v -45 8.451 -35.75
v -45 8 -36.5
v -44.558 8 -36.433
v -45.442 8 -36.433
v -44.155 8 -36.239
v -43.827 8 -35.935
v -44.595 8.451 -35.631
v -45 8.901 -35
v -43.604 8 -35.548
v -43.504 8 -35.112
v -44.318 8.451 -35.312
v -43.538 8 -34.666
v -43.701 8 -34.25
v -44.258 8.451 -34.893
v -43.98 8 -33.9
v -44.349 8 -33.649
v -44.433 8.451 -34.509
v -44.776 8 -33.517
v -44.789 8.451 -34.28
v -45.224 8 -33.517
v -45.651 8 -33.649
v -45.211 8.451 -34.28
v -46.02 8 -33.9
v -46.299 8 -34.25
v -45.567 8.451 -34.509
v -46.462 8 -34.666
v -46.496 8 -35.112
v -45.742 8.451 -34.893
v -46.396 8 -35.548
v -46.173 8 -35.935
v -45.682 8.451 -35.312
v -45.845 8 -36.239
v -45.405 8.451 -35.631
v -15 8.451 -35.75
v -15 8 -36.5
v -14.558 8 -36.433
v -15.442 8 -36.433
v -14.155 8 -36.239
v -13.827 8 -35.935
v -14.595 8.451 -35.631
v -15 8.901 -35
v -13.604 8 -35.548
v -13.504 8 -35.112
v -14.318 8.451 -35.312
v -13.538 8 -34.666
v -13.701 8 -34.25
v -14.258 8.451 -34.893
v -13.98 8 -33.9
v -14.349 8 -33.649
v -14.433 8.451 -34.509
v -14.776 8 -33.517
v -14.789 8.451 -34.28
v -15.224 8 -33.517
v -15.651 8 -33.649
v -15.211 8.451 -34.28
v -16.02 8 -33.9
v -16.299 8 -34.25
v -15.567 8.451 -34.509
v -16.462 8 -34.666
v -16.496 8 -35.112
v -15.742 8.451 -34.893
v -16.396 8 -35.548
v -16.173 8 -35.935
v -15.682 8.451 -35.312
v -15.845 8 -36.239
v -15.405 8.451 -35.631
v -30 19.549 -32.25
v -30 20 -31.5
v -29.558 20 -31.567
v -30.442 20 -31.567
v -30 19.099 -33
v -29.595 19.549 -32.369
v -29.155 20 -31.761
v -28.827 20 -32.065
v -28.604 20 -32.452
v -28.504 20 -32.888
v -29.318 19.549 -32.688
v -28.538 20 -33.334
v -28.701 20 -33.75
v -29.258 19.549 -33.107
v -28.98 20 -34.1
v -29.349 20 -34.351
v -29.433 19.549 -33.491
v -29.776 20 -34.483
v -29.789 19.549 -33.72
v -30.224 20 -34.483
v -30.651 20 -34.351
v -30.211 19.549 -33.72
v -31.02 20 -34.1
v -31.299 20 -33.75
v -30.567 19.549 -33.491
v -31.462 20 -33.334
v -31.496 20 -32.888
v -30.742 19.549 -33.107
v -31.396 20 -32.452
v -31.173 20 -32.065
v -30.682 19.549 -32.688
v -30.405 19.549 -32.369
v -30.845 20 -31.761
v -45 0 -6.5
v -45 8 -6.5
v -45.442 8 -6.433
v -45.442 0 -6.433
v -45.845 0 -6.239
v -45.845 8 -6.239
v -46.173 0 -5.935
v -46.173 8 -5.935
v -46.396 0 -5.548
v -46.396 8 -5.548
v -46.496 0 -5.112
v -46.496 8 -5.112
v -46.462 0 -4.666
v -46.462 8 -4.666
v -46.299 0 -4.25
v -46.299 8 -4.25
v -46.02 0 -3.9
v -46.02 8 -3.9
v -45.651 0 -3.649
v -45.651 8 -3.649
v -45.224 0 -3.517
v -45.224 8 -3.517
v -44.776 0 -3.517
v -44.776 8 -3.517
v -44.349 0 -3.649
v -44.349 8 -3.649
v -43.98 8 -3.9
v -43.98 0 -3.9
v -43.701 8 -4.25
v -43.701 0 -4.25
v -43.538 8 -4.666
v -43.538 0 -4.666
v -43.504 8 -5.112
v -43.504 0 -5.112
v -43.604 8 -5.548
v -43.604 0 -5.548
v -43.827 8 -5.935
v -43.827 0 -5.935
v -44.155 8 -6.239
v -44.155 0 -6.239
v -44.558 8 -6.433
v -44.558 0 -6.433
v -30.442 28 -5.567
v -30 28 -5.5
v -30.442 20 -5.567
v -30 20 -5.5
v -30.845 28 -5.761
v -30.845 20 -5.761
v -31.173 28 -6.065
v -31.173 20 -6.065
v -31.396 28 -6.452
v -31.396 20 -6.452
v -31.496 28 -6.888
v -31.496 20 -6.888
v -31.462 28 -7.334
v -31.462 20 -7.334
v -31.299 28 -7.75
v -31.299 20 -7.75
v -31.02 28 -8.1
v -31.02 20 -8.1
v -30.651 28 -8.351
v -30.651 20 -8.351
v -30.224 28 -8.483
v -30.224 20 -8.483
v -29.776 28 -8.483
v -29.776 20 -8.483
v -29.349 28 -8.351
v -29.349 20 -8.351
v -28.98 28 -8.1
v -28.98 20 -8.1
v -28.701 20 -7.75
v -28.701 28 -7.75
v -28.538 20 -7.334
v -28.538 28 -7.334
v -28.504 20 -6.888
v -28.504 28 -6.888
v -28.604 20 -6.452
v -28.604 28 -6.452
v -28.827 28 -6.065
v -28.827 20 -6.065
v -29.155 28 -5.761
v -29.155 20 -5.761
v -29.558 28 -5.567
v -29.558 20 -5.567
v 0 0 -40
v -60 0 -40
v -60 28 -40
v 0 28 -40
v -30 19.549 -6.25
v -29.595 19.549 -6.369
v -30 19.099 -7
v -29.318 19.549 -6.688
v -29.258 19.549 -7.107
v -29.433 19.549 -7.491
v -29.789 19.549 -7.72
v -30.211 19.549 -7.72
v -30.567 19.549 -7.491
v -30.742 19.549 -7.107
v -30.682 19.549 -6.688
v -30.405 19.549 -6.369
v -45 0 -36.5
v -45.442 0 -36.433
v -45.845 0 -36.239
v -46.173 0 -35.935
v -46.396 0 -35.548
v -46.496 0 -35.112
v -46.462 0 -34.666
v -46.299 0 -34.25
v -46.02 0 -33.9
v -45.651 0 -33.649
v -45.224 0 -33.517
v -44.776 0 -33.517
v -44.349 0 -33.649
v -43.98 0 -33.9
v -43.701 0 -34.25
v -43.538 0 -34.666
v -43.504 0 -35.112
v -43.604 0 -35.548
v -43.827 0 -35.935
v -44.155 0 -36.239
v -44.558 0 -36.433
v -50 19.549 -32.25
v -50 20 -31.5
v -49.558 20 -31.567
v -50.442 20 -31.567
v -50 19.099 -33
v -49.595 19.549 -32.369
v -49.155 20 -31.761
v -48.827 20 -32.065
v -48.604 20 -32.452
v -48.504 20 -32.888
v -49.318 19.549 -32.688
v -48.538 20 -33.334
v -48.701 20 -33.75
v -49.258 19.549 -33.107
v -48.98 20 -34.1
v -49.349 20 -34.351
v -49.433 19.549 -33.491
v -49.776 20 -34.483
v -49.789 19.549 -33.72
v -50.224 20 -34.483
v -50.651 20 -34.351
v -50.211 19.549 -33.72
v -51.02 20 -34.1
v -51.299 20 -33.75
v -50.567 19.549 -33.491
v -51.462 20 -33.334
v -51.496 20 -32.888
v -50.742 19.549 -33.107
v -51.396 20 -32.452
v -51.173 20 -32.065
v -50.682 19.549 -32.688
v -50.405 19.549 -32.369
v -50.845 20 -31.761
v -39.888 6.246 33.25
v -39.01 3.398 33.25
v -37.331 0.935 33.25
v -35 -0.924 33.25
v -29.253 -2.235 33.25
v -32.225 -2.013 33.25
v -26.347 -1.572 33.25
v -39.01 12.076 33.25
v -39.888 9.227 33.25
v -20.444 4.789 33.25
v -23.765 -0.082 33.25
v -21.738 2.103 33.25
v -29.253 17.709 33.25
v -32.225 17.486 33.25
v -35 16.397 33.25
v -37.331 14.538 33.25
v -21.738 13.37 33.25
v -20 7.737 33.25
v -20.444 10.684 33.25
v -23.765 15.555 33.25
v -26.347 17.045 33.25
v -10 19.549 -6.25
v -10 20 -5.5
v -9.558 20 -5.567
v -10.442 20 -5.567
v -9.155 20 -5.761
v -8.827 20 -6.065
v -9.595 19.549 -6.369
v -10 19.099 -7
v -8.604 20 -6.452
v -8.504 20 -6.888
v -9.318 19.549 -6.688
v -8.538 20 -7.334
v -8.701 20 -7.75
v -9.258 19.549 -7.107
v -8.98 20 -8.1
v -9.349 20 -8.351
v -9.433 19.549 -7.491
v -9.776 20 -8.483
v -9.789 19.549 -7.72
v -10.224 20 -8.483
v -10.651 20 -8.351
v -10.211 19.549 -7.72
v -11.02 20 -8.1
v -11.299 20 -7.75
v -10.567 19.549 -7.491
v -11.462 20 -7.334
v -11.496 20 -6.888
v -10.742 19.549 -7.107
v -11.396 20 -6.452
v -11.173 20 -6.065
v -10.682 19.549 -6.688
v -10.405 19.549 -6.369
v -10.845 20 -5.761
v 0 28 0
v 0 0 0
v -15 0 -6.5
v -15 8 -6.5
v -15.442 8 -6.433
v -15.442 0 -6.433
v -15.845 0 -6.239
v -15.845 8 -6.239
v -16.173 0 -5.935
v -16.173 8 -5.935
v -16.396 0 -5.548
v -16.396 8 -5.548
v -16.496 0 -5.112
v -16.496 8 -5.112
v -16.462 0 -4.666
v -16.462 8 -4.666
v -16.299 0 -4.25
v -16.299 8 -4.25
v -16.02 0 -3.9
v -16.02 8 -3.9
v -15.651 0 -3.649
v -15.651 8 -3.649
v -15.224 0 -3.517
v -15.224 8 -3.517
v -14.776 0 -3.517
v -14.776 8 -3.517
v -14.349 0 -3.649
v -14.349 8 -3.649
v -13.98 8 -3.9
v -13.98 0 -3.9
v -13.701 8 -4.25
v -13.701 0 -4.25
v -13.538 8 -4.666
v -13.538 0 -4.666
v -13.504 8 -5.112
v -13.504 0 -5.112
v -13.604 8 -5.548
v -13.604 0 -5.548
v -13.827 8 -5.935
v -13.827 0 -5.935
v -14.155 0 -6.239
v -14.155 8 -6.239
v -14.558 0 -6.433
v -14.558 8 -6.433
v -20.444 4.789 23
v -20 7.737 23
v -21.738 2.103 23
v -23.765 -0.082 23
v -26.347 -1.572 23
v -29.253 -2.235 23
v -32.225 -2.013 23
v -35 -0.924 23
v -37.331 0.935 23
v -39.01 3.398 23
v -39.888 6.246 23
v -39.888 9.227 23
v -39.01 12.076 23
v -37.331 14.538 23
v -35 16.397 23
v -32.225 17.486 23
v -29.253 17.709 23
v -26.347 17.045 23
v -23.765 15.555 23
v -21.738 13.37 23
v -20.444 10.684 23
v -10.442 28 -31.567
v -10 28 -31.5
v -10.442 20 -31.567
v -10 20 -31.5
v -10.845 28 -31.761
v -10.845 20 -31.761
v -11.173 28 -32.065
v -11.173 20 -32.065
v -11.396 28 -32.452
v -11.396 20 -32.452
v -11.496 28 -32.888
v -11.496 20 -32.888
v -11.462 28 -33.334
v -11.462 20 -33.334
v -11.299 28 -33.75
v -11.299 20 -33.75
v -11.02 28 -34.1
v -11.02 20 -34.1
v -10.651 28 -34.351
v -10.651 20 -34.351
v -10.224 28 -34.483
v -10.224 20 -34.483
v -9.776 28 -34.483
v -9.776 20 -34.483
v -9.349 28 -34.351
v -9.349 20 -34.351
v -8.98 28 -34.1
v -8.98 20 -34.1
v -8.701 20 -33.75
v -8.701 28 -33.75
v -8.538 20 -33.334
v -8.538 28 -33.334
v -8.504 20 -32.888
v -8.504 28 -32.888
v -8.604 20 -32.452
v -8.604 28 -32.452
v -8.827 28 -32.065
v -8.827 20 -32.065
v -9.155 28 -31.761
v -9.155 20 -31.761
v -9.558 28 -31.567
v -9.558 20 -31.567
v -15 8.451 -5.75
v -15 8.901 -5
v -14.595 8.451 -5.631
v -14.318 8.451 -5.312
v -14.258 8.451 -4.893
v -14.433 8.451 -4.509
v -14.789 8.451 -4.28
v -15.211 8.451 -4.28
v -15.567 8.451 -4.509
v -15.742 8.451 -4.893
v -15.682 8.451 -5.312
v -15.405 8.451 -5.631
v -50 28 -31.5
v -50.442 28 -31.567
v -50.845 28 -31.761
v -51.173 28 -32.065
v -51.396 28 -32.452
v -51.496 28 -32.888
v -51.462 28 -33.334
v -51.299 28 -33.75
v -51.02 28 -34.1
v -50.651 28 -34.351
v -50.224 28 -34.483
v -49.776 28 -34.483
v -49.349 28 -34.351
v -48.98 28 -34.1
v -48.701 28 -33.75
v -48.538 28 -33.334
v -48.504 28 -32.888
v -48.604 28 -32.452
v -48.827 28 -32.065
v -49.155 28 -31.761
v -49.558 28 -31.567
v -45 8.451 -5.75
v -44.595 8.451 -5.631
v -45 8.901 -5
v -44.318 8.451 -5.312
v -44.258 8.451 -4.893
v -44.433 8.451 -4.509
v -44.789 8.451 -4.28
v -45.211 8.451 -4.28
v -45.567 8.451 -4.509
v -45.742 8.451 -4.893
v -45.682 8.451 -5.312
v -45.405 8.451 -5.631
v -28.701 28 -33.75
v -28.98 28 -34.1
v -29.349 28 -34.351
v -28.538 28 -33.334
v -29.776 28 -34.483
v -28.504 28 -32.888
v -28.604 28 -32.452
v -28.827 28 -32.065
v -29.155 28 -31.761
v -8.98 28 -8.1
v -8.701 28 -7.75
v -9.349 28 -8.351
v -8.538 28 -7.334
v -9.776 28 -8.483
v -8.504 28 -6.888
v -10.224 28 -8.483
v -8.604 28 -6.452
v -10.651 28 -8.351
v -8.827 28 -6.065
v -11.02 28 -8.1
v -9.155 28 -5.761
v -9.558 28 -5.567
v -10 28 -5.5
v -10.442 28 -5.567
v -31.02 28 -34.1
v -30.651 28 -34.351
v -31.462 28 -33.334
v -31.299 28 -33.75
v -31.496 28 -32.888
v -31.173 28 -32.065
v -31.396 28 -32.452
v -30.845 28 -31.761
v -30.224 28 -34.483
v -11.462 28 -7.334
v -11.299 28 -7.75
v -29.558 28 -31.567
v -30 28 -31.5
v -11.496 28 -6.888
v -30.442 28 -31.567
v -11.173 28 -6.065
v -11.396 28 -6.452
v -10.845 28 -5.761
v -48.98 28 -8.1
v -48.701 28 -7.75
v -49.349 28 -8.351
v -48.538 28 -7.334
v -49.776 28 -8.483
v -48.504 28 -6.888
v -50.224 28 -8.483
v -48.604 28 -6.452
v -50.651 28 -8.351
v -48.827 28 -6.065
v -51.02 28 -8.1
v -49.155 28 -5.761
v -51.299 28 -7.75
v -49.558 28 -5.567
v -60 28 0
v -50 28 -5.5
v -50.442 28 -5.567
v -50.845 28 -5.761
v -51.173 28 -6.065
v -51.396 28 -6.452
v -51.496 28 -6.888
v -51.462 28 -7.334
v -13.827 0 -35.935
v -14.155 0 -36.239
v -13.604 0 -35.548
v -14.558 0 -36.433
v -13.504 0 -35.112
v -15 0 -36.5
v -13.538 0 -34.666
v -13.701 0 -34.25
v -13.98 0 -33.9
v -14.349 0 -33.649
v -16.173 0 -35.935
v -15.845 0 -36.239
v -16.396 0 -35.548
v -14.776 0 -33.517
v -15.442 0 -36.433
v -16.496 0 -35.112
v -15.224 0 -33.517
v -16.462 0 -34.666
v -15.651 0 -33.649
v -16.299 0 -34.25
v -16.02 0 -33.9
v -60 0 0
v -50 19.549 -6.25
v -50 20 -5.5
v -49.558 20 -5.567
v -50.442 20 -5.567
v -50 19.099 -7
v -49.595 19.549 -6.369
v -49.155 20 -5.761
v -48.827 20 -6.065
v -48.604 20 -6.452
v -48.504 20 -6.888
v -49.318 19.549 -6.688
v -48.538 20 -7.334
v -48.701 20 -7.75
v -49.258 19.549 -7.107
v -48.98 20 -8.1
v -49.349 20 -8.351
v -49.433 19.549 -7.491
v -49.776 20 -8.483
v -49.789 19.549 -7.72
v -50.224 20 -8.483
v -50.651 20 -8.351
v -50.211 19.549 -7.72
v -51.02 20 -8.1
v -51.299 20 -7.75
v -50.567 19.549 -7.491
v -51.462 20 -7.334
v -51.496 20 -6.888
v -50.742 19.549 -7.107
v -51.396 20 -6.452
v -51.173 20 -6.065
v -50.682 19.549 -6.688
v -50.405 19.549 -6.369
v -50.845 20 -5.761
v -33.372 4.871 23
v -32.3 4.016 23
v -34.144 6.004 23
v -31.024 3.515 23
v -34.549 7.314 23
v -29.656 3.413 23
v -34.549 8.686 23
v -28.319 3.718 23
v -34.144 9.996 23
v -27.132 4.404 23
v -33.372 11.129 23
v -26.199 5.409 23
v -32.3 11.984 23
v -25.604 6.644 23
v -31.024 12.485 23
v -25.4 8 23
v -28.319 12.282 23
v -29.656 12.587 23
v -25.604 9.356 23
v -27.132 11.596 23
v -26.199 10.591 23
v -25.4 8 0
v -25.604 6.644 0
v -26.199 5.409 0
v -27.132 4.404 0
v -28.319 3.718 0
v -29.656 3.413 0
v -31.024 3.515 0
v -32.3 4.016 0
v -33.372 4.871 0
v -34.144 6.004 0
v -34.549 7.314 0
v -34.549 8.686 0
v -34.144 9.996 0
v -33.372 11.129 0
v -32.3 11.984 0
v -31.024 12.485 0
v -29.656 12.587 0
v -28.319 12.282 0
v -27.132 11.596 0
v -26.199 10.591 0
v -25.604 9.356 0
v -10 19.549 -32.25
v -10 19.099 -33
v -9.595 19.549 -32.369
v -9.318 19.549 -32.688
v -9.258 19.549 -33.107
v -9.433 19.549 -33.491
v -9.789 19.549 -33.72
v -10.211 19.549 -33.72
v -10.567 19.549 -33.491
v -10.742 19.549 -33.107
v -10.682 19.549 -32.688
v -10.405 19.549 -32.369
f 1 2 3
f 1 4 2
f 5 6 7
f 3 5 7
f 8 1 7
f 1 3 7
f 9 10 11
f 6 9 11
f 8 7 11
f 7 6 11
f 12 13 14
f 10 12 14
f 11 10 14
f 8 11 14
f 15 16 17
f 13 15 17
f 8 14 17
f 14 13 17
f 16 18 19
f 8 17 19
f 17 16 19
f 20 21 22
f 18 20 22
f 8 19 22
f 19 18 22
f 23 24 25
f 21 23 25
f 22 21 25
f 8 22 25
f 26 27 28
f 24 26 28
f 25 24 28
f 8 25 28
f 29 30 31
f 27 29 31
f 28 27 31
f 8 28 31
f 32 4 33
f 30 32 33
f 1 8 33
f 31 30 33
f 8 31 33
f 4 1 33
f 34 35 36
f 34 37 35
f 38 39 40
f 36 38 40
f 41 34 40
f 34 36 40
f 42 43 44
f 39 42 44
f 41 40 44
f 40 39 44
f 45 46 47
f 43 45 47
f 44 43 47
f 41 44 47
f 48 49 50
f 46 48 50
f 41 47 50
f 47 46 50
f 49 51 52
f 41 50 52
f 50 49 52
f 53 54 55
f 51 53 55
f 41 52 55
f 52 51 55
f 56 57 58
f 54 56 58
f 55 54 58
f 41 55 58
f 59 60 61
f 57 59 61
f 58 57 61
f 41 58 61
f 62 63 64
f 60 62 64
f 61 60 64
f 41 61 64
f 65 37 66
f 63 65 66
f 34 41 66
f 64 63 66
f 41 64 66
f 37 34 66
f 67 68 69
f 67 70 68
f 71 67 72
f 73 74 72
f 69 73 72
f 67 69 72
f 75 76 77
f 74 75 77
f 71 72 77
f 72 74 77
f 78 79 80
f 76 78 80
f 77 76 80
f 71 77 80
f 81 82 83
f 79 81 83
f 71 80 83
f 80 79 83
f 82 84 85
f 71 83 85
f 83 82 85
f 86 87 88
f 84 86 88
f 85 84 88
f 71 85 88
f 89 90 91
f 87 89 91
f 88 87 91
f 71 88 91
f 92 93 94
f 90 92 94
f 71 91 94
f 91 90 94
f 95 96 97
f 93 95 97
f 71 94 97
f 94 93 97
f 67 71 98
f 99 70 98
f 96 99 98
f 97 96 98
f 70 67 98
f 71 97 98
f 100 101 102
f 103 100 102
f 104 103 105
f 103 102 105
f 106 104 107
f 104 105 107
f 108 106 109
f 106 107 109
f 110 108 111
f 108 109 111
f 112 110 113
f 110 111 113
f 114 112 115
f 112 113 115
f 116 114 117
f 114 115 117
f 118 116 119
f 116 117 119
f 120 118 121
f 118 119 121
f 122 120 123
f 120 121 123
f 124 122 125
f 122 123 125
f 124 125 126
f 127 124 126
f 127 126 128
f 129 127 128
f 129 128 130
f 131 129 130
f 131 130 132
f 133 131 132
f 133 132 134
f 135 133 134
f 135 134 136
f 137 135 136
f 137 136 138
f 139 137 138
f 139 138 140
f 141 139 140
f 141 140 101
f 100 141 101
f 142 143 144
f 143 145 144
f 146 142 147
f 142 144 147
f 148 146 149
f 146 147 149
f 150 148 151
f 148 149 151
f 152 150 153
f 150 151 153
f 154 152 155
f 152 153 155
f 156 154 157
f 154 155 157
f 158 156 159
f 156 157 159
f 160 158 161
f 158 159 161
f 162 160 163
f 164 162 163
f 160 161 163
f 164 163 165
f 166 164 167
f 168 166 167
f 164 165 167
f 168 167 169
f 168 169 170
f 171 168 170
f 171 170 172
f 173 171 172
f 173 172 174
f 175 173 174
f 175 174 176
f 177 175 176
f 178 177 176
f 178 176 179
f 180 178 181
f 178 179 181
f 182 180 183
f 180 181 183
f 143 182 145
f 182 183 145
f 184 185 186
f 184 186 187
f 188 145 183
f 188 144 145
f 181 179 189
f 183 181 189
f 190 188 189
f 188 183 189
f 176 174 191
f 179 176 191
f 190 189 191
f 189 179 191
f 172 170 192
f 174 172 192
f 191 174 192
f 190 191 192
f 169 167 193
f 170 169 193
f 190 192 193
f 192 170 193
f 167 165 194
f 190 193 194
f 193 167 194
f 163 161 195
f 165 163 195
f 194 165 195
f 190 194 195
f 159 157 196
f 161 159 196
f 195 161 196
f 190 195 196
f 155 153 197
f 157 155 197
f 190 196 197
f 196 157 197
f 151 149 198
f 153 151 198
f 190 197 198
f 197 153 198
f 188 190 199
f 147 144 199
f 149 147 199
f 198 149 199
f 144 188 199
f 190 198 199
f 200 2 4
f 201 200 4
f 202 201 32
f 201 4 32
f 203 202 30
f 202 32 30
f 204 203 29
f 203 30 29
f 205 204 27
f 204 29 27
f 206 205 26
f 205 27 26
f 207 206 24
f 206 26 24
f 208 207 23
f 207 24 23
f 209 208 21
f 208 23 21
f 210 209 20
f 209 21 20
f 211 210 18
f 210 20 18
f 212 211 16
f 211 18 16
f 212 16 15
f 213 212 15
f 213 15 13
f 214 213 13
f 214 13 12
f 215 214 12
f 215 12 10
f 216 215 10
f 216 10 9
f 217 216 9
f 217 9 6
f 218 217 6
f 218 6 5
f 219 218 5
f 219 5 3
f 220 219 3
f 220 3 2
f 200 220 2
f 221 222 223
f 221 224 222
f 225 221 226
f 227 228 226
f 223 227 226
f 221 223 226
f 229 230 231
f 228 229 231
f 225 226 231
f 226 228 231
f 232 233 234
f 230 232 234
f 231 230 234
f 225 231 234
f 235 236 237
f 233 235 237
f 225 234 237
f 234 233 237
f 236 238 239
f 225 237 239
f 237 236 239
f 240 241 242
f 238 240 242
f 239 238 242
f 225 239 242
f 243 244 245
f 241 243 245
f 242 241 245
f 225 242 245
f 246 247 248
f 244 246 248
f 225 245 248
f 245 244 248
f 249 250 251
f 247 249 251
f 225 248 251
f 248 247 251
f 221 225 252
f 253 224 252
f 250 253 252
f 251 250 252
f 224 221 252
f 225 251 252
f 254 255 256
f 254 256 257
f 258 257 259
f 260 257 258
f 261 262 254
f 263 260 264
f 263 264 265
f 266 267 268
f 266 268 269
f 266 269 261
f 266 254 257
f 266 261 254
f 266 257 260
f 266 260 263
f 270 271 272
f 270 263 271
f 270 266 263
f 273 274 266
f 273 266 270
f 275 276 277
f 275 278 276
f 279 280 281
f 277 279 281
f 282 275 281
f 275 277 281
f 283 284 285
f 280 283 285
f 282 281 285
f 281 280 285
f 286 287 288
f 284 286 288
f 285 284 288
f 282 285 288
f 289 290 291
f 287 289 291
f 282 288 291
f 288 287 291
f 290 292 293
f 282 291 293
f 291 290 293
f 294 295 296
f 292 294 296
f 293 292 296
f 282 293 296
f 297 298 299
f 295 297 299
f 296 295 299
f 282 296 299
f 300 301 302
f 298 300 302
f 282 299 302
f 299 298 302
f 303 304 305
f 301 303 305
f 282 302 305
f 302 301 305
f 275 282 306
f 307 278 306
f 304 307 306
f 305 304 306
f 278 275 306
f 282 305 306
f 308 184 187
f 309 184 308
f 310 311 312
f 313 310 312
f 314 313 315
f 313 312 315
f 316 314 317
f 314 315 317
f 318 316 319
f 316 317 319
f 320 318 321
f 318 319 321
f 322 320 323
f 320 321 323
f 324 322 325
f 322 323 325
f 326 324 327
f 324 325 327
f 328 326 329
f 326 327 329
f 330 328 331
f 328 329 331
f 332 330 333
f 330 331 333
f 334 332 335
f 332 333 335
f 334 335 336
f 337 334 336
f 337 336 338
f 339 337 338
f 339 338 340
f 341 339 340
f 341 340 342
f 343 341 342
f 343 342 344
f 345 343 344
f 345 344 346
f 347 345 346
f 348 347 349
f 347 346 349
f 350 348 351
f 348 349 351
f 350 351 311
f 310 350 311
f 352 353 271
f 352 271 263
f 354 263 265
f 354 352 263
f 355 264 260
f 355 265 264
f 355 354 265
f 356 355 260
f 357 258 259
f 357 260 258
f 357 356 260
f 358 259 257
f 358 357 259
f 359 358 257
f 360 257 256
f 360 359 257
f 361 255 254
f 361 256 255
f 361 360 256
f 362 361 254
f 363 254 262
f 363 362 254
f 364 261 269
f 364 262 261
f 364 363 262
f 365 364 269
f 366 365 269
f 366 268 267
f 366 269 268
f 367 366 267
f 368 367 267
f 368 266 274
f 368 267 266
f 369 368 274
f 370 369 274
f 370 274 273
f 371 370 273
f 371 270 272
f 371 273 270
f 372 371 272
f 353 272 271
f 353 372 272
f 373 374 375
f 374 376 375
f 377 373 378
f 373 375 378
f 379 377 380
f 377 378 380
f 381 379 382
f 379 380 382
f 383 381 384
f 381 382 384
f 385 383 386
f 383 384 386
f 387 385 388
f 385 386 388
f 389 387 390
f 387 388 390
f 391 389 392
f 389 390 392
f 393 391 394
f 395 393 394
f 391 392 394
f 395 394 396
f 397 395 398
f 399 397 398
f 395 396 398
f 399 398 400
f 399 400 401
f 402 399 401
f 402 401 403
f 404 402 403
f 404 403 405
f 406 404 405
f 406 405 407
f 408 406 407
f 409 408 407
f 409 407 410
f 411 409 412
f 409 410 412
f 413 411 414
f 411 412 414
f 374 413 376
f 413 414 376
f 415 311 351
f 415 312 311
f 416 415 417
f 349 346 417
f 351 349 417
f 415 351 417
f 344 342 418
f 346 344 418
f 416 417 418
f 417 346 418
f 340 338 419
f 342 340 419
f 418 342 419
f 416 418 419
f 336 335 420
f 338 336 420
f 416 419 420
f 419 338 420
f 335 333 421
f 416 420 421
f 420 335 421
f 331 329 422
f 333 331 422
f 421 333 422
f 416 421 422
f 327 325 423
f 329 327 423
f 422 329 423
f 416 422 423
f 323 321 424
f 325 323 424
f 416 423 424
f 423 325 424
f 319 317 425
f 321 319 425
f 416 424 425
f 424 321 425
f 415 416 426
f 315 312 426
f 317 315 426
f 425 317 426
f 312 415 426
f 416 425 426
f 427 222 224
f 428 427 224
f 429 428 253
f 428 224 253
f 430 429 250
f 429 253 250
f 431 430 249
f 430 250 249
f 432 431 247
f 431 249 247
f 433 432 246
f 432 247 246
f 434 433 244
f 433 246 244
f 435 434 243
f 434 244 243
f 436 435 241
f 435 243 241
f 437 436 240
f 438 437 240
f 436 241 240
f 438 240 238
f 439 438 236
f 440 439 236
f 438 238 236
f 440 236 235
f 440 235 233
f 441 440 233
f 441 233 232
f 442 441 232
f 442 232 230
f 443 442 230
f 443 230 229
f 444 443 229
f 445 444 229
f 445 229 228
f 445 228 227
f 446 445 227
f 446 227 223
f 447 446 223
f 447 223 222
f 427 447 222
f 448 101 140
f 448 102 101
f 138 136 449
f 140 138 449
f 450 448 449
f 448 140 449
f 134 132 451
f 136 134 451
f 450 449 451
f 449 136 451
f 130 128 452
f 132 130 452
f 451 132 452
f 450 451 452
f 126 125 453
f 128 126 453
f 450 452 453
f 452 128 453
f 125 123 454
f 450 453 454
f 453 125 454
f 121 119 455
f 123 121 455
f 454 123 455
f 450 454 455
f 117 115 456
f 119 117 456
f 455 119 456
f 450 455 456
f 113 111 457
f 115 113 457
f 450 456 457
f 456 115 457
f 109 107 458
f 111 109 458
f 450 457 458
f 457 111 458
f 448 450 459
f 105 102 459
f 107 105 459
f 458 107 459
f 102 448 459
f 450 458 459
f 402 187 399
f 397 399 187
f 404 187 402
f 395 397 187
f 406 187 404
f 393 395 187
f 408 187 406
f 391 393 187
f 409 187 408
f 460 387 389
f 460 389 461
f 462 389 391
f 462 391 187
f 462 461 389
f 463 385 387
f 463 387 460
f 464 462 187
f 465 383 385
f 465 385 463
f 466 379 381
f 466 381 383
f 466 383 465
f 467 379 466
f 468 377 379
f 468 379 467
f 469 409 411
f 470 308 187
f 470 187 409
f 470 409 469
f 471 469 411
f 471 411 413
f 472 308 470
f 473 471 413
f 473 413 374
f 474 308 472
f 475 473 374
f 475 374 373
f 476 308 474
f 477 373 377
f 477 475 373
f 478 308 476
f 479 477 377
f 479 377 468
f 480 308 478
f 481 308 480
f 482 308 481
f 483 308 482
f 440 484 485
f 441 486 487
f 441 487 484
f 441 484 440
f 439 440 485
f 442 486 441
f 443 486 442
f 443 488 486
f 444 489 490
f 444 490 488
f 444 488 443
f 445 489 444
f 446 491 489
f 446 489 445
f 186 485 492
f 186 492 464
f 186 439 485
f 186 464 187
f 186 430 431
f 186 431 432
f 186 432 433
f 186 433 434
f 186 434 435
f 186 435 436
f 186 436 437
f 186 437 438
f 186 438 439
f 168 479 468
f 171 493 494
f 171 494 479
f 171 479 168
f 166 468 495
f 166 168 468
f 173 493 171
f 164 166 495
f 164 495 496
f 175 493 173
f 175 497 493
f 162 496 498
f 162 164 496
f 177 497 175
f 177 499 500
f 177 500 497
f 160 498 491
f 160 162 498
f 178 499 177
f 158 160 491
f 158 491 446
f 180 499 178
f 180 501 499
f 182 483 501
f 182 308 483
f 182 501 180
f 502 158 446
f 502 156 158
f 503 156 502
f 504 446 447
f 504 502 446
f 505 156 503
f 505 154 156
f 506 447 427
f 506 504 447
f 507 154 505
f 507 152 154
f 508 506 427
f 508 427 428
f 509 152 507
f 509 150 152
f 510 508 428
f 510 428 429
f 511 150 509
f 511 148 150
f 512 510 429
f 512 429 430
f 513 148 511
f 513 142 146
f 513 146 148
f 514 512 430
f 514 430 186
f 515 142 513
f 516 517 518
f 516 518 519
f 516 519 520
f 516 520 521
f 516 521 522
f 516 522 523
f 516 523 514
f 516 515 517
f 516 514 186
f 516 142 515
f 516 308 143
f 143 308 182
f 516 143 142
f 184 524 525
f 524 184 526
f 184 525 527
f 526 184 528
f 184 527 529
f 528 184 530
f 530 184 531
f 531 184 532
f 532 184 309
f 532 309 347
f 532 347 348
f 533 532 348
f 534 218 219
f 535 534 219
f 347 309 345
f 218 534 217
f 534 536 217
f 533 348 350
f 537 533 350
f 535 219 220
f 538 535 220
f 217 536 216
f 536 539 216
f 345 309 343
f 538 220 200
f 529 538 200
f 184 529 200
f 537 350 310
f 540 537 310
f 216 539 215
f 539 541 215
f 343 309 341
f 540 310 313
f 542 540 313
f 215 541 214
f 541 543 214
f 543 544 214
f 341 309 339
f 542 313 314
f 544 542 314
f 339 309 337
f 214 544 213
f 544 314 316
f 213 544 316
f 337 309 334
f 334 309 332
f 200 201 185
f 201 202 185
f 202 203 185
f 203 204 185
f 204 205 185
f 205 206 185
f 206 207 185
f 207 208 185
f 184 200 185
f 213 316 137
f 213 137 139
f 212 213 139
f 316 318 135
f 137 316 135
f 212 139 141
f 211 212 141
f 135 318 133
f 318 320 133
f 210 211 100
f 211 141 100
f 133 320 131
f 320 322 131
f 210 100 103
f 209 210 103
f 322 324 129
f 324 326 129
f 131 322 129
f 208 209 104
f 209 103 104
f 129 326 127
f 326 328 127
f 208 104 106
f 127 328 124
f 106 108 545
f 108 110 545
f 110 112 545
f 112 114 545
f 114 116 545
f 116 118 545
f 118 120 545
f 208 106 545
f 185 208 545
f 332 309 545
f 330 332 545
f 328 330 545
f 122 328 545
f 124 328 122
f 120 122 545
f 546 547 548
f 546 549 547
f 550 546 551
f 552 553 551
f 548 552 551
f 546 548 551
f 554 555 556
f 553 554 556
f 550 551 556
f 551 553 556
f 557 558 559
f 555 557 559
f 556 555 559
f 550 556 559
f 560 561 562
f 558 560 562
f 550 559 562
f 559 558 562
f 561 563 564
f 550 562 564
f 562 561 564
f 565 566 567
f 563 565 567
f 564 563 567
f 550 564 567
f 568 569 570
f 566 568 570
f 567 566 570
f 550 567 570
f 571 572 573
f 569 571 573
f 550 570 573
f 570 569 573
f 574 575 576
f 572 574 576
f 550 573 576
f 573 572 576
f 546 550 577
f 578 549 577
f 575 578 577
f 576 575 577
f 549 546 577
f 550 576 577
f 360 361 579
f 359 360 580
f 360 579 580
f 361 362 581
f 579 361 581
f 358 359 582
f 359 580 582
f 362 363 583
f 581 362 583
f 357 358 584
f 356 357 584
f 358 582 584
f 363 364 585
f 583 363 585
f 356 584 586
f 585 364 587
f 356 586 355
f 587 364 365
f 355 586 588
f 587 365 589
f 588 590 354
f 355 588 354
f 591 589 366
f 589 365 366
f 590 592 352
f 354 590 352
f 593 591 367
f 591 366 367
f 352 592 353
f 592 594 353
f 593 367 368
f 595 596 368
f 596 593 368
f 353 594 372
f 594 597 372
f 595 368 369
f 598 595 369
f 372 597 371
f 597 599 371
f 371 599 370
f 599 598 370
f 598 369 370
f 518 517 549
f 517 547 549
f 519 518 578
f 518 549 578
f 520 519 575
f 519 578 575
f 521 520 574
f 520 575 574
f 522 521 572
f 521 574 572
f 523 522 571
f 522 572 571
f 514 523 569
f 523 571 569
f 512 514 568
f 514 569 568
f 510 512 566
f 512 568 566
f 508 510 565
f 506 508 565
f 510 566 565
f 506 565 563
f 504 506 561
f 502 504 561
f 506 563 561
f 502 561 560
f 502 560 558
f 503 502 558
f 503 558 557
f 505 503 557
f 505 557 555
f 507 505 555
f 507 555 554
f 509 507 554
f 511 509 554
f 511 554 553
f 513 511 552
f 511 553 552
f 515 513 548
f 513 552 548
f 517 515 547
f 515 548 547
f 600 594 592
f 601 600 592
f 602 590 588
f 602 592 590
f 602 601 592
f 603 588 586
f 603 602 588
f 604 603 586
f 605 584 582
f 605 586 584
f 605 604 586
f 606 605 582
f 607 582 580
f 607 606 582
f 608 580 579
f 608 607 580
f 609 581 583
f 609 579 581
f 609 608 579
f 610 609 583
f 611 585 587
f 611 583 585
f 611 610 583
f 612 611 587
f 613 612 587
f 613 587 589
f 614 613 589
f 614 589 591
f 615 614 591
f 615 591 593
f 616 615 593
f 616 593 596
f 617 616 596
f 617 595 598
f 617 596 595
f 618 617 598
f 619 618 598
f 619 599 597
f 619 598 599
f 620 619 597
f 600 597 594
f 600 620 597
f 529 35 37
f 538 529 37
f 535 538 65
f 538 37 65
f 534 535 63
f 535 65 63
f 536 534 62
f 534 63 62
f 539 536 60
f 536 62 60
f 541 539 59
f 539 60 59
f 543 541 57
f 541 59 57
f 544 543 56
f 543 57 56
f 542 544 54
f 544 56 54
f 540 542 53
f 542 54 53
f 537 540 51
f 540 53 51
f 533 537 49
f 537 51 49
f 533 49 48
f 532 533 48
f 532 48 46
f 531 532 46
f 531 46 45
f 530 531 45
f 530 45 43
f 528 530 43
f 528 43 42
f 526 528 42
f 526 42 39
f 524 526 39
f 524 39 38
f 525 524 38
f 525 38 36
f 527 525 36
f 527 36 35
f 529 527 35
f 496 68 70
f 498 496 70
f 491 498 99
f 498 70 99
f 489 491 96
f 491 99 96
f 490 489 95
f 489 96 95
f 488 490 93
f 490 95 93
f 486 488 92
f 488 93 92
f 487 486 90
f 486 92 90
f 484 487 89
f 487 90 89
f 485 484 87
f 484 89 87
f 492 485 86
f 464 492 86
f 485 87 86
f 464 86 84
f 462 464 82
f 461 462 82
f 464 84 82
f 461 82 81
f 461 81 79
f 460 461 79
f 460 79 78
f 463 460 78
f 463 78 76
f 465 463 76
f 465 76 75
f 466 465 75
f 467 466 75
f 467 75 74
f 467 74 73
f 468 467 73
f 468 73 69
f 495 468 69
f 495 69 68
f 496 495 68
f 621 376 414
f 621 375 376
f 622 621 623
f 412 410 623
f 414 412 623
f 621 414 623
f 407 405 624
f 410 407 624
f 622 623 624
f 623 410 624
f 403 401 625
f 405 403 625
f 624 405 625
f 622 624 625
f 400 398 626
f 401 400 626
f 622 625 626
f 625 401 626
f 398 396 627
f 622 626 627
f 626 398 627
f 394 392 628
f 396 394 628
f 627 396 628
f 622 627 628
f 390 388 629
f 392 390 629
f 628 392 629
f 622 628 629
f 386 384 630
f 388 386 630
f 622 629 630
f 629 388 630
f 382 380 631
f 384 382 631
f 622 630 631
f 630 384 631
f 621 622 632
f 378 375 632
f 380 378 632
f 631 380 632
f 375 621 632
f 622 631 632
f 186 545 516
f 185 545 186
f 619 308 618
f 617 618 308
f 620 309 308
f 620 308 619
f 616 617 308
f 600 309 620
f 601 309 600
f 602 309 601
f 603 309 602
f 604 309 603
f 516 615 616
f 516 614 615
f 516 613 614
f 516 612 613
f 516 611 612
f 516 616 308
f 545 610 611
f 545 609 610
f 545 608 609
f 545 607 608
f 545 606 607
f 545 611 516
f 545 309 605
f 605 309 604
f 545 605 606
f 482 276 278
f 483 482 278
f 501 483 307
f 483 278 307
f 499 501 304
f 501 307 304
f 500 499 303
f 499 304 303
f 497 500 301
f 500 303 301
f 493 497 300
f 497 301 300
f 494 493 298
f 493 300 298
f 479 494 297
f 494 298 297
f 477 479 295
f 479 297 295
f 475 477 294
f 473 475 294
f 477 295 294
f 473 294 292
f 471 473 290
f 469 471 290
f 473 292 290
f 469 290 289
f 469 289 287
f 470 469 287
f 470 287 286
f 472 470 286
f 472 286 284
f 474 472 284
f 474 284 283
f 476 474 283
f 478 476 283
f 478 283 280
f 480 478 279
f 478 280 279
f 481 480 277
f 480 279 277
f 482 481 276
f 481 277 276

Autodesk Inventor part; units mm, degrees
ref_plane "YZ Plane" through (0, 0, 0) normal (1, 0, 0) x (0, 1, 0)
ref_plane "XZ Plane" through (0, 0, 0) normal (0, 1, 0) x (-1, 0, 0)
ref_plane "XY Plane" through (0, 0, 0) normal (0, 0, 1) x (1, 0, 0)
sketch "Sketch1" plane through (0, 0, 0) normal (0, 1, 0) x (-1, 0, 0)
  line L0 (0, 0) -> (60, 0)
  line L1 (60, 0) -> (60, -40)
  line L2 (60, -40) -> (0, -40)
  line L3 (0, -40) -> (0, 0)
  dimension "d0" = 60
  dimension "d1" = 40
extrude "Extrusion1" add sketch "Sketch1" along normal blind 28
sketch "Sketch2" plane through (-60, 0, 0) normal (0, 0, 1) x (1, 0, 0)
  circle A0 centre (30, 8) radius 4.6
  line L0 (60, 0) -> (60, 28) projected
  line L1 (60, 0) -> (0, 0) projected
  dimension "d4" = 9.2
  dimension "d5" = 30
  dimension "d6" = 8
extrude "Extrusion2" add sketch "Sketch2" along normal blind 23
sketch "Sketch3" plane through (-30, 8, 23) normal (0, 0, 1) x (1, 0, 0)
  circle A0 centre (0, 0) radius 4.6 projected
  circle A1 centre (0, -0.2633) radius 10
  point P0 (30, -8)
  dimension "d9" = 20
extrude "Extrusion3" add sketch "Sketch3" along normal blind 10.25 contours A0 | A1
sketch "Sketch4" plane through (0, 0, 0) normal (0, -1, 0) x (1, 0, 0)
  line L0 (0, 0) -> (-60, 0) projected
  line L1 (-60, 0) -> (-60, -40) projected
  line L2 (-60, -40) -> (0, -40) projected
  line L3 (0, -40) -> (0, 0) projected
  line L4 (-45, -35) -> (-15, -35)
  line L5 (-15, -35) -> (-15, -5)
  line L6 (-15, -5) -> (-45, -5)
  line L7 (-45, -5) -> (-45, -35)
  line L8 (-45, -35) -> (-15, -5) construction
  line L9 (-15, -35) -> (-45, -5) construction
  point P0 (-30, -20)
  dimension "d12" = 30
  dimension "d13" = 30
hole "Hole1" at (-15, 0, -5) at (-15, 0, -35) at (-45, 0, -35) at (-45, 0, -5) direction (0, 1, 0) diameter 3 depth 8 tip angle 118
sketch "Sketch5" plane through (0, 28, 0) normal (0, 1, 0) x (1, 0, 0)
  line L0 (-60, 0) -> (0, 0) projected
  line L1 (0, 0) -> (0, 40) projected
  line L2 (0, 40) -> (-60, 40) projected
  line L3 (-60, 40) -> (-60, 0) projected
  line L4 (-10, 7) -> (-50, 7)
  line L5 (-50, 7) -> (-50, 33)
  line L6 (-50, 33) -> (-10, 33)
  line L7 (-10, 33) -> (-10, 7)
  line L8 (-10, 7) -> (-50, 33) construction
  line L9 (-50, 7) -> (-10, 33) construction
  point P0 (-30, 20)
  point P1 (-30, 7)
  point P2 (-30, 33)
  dimension "d21" = 40
  dimension "d22" = 26
hole "Hole2" at (-30, 28, -7) at (-30, 28, -33) at (-50, 28, -7) at (-50, 28, -33) at (-10, 28, -33) at (-10, 28, -7) direction (0, -1, 0) diameter 3 depth 8 tip angle 118
properties part number "00_Z-stage"
